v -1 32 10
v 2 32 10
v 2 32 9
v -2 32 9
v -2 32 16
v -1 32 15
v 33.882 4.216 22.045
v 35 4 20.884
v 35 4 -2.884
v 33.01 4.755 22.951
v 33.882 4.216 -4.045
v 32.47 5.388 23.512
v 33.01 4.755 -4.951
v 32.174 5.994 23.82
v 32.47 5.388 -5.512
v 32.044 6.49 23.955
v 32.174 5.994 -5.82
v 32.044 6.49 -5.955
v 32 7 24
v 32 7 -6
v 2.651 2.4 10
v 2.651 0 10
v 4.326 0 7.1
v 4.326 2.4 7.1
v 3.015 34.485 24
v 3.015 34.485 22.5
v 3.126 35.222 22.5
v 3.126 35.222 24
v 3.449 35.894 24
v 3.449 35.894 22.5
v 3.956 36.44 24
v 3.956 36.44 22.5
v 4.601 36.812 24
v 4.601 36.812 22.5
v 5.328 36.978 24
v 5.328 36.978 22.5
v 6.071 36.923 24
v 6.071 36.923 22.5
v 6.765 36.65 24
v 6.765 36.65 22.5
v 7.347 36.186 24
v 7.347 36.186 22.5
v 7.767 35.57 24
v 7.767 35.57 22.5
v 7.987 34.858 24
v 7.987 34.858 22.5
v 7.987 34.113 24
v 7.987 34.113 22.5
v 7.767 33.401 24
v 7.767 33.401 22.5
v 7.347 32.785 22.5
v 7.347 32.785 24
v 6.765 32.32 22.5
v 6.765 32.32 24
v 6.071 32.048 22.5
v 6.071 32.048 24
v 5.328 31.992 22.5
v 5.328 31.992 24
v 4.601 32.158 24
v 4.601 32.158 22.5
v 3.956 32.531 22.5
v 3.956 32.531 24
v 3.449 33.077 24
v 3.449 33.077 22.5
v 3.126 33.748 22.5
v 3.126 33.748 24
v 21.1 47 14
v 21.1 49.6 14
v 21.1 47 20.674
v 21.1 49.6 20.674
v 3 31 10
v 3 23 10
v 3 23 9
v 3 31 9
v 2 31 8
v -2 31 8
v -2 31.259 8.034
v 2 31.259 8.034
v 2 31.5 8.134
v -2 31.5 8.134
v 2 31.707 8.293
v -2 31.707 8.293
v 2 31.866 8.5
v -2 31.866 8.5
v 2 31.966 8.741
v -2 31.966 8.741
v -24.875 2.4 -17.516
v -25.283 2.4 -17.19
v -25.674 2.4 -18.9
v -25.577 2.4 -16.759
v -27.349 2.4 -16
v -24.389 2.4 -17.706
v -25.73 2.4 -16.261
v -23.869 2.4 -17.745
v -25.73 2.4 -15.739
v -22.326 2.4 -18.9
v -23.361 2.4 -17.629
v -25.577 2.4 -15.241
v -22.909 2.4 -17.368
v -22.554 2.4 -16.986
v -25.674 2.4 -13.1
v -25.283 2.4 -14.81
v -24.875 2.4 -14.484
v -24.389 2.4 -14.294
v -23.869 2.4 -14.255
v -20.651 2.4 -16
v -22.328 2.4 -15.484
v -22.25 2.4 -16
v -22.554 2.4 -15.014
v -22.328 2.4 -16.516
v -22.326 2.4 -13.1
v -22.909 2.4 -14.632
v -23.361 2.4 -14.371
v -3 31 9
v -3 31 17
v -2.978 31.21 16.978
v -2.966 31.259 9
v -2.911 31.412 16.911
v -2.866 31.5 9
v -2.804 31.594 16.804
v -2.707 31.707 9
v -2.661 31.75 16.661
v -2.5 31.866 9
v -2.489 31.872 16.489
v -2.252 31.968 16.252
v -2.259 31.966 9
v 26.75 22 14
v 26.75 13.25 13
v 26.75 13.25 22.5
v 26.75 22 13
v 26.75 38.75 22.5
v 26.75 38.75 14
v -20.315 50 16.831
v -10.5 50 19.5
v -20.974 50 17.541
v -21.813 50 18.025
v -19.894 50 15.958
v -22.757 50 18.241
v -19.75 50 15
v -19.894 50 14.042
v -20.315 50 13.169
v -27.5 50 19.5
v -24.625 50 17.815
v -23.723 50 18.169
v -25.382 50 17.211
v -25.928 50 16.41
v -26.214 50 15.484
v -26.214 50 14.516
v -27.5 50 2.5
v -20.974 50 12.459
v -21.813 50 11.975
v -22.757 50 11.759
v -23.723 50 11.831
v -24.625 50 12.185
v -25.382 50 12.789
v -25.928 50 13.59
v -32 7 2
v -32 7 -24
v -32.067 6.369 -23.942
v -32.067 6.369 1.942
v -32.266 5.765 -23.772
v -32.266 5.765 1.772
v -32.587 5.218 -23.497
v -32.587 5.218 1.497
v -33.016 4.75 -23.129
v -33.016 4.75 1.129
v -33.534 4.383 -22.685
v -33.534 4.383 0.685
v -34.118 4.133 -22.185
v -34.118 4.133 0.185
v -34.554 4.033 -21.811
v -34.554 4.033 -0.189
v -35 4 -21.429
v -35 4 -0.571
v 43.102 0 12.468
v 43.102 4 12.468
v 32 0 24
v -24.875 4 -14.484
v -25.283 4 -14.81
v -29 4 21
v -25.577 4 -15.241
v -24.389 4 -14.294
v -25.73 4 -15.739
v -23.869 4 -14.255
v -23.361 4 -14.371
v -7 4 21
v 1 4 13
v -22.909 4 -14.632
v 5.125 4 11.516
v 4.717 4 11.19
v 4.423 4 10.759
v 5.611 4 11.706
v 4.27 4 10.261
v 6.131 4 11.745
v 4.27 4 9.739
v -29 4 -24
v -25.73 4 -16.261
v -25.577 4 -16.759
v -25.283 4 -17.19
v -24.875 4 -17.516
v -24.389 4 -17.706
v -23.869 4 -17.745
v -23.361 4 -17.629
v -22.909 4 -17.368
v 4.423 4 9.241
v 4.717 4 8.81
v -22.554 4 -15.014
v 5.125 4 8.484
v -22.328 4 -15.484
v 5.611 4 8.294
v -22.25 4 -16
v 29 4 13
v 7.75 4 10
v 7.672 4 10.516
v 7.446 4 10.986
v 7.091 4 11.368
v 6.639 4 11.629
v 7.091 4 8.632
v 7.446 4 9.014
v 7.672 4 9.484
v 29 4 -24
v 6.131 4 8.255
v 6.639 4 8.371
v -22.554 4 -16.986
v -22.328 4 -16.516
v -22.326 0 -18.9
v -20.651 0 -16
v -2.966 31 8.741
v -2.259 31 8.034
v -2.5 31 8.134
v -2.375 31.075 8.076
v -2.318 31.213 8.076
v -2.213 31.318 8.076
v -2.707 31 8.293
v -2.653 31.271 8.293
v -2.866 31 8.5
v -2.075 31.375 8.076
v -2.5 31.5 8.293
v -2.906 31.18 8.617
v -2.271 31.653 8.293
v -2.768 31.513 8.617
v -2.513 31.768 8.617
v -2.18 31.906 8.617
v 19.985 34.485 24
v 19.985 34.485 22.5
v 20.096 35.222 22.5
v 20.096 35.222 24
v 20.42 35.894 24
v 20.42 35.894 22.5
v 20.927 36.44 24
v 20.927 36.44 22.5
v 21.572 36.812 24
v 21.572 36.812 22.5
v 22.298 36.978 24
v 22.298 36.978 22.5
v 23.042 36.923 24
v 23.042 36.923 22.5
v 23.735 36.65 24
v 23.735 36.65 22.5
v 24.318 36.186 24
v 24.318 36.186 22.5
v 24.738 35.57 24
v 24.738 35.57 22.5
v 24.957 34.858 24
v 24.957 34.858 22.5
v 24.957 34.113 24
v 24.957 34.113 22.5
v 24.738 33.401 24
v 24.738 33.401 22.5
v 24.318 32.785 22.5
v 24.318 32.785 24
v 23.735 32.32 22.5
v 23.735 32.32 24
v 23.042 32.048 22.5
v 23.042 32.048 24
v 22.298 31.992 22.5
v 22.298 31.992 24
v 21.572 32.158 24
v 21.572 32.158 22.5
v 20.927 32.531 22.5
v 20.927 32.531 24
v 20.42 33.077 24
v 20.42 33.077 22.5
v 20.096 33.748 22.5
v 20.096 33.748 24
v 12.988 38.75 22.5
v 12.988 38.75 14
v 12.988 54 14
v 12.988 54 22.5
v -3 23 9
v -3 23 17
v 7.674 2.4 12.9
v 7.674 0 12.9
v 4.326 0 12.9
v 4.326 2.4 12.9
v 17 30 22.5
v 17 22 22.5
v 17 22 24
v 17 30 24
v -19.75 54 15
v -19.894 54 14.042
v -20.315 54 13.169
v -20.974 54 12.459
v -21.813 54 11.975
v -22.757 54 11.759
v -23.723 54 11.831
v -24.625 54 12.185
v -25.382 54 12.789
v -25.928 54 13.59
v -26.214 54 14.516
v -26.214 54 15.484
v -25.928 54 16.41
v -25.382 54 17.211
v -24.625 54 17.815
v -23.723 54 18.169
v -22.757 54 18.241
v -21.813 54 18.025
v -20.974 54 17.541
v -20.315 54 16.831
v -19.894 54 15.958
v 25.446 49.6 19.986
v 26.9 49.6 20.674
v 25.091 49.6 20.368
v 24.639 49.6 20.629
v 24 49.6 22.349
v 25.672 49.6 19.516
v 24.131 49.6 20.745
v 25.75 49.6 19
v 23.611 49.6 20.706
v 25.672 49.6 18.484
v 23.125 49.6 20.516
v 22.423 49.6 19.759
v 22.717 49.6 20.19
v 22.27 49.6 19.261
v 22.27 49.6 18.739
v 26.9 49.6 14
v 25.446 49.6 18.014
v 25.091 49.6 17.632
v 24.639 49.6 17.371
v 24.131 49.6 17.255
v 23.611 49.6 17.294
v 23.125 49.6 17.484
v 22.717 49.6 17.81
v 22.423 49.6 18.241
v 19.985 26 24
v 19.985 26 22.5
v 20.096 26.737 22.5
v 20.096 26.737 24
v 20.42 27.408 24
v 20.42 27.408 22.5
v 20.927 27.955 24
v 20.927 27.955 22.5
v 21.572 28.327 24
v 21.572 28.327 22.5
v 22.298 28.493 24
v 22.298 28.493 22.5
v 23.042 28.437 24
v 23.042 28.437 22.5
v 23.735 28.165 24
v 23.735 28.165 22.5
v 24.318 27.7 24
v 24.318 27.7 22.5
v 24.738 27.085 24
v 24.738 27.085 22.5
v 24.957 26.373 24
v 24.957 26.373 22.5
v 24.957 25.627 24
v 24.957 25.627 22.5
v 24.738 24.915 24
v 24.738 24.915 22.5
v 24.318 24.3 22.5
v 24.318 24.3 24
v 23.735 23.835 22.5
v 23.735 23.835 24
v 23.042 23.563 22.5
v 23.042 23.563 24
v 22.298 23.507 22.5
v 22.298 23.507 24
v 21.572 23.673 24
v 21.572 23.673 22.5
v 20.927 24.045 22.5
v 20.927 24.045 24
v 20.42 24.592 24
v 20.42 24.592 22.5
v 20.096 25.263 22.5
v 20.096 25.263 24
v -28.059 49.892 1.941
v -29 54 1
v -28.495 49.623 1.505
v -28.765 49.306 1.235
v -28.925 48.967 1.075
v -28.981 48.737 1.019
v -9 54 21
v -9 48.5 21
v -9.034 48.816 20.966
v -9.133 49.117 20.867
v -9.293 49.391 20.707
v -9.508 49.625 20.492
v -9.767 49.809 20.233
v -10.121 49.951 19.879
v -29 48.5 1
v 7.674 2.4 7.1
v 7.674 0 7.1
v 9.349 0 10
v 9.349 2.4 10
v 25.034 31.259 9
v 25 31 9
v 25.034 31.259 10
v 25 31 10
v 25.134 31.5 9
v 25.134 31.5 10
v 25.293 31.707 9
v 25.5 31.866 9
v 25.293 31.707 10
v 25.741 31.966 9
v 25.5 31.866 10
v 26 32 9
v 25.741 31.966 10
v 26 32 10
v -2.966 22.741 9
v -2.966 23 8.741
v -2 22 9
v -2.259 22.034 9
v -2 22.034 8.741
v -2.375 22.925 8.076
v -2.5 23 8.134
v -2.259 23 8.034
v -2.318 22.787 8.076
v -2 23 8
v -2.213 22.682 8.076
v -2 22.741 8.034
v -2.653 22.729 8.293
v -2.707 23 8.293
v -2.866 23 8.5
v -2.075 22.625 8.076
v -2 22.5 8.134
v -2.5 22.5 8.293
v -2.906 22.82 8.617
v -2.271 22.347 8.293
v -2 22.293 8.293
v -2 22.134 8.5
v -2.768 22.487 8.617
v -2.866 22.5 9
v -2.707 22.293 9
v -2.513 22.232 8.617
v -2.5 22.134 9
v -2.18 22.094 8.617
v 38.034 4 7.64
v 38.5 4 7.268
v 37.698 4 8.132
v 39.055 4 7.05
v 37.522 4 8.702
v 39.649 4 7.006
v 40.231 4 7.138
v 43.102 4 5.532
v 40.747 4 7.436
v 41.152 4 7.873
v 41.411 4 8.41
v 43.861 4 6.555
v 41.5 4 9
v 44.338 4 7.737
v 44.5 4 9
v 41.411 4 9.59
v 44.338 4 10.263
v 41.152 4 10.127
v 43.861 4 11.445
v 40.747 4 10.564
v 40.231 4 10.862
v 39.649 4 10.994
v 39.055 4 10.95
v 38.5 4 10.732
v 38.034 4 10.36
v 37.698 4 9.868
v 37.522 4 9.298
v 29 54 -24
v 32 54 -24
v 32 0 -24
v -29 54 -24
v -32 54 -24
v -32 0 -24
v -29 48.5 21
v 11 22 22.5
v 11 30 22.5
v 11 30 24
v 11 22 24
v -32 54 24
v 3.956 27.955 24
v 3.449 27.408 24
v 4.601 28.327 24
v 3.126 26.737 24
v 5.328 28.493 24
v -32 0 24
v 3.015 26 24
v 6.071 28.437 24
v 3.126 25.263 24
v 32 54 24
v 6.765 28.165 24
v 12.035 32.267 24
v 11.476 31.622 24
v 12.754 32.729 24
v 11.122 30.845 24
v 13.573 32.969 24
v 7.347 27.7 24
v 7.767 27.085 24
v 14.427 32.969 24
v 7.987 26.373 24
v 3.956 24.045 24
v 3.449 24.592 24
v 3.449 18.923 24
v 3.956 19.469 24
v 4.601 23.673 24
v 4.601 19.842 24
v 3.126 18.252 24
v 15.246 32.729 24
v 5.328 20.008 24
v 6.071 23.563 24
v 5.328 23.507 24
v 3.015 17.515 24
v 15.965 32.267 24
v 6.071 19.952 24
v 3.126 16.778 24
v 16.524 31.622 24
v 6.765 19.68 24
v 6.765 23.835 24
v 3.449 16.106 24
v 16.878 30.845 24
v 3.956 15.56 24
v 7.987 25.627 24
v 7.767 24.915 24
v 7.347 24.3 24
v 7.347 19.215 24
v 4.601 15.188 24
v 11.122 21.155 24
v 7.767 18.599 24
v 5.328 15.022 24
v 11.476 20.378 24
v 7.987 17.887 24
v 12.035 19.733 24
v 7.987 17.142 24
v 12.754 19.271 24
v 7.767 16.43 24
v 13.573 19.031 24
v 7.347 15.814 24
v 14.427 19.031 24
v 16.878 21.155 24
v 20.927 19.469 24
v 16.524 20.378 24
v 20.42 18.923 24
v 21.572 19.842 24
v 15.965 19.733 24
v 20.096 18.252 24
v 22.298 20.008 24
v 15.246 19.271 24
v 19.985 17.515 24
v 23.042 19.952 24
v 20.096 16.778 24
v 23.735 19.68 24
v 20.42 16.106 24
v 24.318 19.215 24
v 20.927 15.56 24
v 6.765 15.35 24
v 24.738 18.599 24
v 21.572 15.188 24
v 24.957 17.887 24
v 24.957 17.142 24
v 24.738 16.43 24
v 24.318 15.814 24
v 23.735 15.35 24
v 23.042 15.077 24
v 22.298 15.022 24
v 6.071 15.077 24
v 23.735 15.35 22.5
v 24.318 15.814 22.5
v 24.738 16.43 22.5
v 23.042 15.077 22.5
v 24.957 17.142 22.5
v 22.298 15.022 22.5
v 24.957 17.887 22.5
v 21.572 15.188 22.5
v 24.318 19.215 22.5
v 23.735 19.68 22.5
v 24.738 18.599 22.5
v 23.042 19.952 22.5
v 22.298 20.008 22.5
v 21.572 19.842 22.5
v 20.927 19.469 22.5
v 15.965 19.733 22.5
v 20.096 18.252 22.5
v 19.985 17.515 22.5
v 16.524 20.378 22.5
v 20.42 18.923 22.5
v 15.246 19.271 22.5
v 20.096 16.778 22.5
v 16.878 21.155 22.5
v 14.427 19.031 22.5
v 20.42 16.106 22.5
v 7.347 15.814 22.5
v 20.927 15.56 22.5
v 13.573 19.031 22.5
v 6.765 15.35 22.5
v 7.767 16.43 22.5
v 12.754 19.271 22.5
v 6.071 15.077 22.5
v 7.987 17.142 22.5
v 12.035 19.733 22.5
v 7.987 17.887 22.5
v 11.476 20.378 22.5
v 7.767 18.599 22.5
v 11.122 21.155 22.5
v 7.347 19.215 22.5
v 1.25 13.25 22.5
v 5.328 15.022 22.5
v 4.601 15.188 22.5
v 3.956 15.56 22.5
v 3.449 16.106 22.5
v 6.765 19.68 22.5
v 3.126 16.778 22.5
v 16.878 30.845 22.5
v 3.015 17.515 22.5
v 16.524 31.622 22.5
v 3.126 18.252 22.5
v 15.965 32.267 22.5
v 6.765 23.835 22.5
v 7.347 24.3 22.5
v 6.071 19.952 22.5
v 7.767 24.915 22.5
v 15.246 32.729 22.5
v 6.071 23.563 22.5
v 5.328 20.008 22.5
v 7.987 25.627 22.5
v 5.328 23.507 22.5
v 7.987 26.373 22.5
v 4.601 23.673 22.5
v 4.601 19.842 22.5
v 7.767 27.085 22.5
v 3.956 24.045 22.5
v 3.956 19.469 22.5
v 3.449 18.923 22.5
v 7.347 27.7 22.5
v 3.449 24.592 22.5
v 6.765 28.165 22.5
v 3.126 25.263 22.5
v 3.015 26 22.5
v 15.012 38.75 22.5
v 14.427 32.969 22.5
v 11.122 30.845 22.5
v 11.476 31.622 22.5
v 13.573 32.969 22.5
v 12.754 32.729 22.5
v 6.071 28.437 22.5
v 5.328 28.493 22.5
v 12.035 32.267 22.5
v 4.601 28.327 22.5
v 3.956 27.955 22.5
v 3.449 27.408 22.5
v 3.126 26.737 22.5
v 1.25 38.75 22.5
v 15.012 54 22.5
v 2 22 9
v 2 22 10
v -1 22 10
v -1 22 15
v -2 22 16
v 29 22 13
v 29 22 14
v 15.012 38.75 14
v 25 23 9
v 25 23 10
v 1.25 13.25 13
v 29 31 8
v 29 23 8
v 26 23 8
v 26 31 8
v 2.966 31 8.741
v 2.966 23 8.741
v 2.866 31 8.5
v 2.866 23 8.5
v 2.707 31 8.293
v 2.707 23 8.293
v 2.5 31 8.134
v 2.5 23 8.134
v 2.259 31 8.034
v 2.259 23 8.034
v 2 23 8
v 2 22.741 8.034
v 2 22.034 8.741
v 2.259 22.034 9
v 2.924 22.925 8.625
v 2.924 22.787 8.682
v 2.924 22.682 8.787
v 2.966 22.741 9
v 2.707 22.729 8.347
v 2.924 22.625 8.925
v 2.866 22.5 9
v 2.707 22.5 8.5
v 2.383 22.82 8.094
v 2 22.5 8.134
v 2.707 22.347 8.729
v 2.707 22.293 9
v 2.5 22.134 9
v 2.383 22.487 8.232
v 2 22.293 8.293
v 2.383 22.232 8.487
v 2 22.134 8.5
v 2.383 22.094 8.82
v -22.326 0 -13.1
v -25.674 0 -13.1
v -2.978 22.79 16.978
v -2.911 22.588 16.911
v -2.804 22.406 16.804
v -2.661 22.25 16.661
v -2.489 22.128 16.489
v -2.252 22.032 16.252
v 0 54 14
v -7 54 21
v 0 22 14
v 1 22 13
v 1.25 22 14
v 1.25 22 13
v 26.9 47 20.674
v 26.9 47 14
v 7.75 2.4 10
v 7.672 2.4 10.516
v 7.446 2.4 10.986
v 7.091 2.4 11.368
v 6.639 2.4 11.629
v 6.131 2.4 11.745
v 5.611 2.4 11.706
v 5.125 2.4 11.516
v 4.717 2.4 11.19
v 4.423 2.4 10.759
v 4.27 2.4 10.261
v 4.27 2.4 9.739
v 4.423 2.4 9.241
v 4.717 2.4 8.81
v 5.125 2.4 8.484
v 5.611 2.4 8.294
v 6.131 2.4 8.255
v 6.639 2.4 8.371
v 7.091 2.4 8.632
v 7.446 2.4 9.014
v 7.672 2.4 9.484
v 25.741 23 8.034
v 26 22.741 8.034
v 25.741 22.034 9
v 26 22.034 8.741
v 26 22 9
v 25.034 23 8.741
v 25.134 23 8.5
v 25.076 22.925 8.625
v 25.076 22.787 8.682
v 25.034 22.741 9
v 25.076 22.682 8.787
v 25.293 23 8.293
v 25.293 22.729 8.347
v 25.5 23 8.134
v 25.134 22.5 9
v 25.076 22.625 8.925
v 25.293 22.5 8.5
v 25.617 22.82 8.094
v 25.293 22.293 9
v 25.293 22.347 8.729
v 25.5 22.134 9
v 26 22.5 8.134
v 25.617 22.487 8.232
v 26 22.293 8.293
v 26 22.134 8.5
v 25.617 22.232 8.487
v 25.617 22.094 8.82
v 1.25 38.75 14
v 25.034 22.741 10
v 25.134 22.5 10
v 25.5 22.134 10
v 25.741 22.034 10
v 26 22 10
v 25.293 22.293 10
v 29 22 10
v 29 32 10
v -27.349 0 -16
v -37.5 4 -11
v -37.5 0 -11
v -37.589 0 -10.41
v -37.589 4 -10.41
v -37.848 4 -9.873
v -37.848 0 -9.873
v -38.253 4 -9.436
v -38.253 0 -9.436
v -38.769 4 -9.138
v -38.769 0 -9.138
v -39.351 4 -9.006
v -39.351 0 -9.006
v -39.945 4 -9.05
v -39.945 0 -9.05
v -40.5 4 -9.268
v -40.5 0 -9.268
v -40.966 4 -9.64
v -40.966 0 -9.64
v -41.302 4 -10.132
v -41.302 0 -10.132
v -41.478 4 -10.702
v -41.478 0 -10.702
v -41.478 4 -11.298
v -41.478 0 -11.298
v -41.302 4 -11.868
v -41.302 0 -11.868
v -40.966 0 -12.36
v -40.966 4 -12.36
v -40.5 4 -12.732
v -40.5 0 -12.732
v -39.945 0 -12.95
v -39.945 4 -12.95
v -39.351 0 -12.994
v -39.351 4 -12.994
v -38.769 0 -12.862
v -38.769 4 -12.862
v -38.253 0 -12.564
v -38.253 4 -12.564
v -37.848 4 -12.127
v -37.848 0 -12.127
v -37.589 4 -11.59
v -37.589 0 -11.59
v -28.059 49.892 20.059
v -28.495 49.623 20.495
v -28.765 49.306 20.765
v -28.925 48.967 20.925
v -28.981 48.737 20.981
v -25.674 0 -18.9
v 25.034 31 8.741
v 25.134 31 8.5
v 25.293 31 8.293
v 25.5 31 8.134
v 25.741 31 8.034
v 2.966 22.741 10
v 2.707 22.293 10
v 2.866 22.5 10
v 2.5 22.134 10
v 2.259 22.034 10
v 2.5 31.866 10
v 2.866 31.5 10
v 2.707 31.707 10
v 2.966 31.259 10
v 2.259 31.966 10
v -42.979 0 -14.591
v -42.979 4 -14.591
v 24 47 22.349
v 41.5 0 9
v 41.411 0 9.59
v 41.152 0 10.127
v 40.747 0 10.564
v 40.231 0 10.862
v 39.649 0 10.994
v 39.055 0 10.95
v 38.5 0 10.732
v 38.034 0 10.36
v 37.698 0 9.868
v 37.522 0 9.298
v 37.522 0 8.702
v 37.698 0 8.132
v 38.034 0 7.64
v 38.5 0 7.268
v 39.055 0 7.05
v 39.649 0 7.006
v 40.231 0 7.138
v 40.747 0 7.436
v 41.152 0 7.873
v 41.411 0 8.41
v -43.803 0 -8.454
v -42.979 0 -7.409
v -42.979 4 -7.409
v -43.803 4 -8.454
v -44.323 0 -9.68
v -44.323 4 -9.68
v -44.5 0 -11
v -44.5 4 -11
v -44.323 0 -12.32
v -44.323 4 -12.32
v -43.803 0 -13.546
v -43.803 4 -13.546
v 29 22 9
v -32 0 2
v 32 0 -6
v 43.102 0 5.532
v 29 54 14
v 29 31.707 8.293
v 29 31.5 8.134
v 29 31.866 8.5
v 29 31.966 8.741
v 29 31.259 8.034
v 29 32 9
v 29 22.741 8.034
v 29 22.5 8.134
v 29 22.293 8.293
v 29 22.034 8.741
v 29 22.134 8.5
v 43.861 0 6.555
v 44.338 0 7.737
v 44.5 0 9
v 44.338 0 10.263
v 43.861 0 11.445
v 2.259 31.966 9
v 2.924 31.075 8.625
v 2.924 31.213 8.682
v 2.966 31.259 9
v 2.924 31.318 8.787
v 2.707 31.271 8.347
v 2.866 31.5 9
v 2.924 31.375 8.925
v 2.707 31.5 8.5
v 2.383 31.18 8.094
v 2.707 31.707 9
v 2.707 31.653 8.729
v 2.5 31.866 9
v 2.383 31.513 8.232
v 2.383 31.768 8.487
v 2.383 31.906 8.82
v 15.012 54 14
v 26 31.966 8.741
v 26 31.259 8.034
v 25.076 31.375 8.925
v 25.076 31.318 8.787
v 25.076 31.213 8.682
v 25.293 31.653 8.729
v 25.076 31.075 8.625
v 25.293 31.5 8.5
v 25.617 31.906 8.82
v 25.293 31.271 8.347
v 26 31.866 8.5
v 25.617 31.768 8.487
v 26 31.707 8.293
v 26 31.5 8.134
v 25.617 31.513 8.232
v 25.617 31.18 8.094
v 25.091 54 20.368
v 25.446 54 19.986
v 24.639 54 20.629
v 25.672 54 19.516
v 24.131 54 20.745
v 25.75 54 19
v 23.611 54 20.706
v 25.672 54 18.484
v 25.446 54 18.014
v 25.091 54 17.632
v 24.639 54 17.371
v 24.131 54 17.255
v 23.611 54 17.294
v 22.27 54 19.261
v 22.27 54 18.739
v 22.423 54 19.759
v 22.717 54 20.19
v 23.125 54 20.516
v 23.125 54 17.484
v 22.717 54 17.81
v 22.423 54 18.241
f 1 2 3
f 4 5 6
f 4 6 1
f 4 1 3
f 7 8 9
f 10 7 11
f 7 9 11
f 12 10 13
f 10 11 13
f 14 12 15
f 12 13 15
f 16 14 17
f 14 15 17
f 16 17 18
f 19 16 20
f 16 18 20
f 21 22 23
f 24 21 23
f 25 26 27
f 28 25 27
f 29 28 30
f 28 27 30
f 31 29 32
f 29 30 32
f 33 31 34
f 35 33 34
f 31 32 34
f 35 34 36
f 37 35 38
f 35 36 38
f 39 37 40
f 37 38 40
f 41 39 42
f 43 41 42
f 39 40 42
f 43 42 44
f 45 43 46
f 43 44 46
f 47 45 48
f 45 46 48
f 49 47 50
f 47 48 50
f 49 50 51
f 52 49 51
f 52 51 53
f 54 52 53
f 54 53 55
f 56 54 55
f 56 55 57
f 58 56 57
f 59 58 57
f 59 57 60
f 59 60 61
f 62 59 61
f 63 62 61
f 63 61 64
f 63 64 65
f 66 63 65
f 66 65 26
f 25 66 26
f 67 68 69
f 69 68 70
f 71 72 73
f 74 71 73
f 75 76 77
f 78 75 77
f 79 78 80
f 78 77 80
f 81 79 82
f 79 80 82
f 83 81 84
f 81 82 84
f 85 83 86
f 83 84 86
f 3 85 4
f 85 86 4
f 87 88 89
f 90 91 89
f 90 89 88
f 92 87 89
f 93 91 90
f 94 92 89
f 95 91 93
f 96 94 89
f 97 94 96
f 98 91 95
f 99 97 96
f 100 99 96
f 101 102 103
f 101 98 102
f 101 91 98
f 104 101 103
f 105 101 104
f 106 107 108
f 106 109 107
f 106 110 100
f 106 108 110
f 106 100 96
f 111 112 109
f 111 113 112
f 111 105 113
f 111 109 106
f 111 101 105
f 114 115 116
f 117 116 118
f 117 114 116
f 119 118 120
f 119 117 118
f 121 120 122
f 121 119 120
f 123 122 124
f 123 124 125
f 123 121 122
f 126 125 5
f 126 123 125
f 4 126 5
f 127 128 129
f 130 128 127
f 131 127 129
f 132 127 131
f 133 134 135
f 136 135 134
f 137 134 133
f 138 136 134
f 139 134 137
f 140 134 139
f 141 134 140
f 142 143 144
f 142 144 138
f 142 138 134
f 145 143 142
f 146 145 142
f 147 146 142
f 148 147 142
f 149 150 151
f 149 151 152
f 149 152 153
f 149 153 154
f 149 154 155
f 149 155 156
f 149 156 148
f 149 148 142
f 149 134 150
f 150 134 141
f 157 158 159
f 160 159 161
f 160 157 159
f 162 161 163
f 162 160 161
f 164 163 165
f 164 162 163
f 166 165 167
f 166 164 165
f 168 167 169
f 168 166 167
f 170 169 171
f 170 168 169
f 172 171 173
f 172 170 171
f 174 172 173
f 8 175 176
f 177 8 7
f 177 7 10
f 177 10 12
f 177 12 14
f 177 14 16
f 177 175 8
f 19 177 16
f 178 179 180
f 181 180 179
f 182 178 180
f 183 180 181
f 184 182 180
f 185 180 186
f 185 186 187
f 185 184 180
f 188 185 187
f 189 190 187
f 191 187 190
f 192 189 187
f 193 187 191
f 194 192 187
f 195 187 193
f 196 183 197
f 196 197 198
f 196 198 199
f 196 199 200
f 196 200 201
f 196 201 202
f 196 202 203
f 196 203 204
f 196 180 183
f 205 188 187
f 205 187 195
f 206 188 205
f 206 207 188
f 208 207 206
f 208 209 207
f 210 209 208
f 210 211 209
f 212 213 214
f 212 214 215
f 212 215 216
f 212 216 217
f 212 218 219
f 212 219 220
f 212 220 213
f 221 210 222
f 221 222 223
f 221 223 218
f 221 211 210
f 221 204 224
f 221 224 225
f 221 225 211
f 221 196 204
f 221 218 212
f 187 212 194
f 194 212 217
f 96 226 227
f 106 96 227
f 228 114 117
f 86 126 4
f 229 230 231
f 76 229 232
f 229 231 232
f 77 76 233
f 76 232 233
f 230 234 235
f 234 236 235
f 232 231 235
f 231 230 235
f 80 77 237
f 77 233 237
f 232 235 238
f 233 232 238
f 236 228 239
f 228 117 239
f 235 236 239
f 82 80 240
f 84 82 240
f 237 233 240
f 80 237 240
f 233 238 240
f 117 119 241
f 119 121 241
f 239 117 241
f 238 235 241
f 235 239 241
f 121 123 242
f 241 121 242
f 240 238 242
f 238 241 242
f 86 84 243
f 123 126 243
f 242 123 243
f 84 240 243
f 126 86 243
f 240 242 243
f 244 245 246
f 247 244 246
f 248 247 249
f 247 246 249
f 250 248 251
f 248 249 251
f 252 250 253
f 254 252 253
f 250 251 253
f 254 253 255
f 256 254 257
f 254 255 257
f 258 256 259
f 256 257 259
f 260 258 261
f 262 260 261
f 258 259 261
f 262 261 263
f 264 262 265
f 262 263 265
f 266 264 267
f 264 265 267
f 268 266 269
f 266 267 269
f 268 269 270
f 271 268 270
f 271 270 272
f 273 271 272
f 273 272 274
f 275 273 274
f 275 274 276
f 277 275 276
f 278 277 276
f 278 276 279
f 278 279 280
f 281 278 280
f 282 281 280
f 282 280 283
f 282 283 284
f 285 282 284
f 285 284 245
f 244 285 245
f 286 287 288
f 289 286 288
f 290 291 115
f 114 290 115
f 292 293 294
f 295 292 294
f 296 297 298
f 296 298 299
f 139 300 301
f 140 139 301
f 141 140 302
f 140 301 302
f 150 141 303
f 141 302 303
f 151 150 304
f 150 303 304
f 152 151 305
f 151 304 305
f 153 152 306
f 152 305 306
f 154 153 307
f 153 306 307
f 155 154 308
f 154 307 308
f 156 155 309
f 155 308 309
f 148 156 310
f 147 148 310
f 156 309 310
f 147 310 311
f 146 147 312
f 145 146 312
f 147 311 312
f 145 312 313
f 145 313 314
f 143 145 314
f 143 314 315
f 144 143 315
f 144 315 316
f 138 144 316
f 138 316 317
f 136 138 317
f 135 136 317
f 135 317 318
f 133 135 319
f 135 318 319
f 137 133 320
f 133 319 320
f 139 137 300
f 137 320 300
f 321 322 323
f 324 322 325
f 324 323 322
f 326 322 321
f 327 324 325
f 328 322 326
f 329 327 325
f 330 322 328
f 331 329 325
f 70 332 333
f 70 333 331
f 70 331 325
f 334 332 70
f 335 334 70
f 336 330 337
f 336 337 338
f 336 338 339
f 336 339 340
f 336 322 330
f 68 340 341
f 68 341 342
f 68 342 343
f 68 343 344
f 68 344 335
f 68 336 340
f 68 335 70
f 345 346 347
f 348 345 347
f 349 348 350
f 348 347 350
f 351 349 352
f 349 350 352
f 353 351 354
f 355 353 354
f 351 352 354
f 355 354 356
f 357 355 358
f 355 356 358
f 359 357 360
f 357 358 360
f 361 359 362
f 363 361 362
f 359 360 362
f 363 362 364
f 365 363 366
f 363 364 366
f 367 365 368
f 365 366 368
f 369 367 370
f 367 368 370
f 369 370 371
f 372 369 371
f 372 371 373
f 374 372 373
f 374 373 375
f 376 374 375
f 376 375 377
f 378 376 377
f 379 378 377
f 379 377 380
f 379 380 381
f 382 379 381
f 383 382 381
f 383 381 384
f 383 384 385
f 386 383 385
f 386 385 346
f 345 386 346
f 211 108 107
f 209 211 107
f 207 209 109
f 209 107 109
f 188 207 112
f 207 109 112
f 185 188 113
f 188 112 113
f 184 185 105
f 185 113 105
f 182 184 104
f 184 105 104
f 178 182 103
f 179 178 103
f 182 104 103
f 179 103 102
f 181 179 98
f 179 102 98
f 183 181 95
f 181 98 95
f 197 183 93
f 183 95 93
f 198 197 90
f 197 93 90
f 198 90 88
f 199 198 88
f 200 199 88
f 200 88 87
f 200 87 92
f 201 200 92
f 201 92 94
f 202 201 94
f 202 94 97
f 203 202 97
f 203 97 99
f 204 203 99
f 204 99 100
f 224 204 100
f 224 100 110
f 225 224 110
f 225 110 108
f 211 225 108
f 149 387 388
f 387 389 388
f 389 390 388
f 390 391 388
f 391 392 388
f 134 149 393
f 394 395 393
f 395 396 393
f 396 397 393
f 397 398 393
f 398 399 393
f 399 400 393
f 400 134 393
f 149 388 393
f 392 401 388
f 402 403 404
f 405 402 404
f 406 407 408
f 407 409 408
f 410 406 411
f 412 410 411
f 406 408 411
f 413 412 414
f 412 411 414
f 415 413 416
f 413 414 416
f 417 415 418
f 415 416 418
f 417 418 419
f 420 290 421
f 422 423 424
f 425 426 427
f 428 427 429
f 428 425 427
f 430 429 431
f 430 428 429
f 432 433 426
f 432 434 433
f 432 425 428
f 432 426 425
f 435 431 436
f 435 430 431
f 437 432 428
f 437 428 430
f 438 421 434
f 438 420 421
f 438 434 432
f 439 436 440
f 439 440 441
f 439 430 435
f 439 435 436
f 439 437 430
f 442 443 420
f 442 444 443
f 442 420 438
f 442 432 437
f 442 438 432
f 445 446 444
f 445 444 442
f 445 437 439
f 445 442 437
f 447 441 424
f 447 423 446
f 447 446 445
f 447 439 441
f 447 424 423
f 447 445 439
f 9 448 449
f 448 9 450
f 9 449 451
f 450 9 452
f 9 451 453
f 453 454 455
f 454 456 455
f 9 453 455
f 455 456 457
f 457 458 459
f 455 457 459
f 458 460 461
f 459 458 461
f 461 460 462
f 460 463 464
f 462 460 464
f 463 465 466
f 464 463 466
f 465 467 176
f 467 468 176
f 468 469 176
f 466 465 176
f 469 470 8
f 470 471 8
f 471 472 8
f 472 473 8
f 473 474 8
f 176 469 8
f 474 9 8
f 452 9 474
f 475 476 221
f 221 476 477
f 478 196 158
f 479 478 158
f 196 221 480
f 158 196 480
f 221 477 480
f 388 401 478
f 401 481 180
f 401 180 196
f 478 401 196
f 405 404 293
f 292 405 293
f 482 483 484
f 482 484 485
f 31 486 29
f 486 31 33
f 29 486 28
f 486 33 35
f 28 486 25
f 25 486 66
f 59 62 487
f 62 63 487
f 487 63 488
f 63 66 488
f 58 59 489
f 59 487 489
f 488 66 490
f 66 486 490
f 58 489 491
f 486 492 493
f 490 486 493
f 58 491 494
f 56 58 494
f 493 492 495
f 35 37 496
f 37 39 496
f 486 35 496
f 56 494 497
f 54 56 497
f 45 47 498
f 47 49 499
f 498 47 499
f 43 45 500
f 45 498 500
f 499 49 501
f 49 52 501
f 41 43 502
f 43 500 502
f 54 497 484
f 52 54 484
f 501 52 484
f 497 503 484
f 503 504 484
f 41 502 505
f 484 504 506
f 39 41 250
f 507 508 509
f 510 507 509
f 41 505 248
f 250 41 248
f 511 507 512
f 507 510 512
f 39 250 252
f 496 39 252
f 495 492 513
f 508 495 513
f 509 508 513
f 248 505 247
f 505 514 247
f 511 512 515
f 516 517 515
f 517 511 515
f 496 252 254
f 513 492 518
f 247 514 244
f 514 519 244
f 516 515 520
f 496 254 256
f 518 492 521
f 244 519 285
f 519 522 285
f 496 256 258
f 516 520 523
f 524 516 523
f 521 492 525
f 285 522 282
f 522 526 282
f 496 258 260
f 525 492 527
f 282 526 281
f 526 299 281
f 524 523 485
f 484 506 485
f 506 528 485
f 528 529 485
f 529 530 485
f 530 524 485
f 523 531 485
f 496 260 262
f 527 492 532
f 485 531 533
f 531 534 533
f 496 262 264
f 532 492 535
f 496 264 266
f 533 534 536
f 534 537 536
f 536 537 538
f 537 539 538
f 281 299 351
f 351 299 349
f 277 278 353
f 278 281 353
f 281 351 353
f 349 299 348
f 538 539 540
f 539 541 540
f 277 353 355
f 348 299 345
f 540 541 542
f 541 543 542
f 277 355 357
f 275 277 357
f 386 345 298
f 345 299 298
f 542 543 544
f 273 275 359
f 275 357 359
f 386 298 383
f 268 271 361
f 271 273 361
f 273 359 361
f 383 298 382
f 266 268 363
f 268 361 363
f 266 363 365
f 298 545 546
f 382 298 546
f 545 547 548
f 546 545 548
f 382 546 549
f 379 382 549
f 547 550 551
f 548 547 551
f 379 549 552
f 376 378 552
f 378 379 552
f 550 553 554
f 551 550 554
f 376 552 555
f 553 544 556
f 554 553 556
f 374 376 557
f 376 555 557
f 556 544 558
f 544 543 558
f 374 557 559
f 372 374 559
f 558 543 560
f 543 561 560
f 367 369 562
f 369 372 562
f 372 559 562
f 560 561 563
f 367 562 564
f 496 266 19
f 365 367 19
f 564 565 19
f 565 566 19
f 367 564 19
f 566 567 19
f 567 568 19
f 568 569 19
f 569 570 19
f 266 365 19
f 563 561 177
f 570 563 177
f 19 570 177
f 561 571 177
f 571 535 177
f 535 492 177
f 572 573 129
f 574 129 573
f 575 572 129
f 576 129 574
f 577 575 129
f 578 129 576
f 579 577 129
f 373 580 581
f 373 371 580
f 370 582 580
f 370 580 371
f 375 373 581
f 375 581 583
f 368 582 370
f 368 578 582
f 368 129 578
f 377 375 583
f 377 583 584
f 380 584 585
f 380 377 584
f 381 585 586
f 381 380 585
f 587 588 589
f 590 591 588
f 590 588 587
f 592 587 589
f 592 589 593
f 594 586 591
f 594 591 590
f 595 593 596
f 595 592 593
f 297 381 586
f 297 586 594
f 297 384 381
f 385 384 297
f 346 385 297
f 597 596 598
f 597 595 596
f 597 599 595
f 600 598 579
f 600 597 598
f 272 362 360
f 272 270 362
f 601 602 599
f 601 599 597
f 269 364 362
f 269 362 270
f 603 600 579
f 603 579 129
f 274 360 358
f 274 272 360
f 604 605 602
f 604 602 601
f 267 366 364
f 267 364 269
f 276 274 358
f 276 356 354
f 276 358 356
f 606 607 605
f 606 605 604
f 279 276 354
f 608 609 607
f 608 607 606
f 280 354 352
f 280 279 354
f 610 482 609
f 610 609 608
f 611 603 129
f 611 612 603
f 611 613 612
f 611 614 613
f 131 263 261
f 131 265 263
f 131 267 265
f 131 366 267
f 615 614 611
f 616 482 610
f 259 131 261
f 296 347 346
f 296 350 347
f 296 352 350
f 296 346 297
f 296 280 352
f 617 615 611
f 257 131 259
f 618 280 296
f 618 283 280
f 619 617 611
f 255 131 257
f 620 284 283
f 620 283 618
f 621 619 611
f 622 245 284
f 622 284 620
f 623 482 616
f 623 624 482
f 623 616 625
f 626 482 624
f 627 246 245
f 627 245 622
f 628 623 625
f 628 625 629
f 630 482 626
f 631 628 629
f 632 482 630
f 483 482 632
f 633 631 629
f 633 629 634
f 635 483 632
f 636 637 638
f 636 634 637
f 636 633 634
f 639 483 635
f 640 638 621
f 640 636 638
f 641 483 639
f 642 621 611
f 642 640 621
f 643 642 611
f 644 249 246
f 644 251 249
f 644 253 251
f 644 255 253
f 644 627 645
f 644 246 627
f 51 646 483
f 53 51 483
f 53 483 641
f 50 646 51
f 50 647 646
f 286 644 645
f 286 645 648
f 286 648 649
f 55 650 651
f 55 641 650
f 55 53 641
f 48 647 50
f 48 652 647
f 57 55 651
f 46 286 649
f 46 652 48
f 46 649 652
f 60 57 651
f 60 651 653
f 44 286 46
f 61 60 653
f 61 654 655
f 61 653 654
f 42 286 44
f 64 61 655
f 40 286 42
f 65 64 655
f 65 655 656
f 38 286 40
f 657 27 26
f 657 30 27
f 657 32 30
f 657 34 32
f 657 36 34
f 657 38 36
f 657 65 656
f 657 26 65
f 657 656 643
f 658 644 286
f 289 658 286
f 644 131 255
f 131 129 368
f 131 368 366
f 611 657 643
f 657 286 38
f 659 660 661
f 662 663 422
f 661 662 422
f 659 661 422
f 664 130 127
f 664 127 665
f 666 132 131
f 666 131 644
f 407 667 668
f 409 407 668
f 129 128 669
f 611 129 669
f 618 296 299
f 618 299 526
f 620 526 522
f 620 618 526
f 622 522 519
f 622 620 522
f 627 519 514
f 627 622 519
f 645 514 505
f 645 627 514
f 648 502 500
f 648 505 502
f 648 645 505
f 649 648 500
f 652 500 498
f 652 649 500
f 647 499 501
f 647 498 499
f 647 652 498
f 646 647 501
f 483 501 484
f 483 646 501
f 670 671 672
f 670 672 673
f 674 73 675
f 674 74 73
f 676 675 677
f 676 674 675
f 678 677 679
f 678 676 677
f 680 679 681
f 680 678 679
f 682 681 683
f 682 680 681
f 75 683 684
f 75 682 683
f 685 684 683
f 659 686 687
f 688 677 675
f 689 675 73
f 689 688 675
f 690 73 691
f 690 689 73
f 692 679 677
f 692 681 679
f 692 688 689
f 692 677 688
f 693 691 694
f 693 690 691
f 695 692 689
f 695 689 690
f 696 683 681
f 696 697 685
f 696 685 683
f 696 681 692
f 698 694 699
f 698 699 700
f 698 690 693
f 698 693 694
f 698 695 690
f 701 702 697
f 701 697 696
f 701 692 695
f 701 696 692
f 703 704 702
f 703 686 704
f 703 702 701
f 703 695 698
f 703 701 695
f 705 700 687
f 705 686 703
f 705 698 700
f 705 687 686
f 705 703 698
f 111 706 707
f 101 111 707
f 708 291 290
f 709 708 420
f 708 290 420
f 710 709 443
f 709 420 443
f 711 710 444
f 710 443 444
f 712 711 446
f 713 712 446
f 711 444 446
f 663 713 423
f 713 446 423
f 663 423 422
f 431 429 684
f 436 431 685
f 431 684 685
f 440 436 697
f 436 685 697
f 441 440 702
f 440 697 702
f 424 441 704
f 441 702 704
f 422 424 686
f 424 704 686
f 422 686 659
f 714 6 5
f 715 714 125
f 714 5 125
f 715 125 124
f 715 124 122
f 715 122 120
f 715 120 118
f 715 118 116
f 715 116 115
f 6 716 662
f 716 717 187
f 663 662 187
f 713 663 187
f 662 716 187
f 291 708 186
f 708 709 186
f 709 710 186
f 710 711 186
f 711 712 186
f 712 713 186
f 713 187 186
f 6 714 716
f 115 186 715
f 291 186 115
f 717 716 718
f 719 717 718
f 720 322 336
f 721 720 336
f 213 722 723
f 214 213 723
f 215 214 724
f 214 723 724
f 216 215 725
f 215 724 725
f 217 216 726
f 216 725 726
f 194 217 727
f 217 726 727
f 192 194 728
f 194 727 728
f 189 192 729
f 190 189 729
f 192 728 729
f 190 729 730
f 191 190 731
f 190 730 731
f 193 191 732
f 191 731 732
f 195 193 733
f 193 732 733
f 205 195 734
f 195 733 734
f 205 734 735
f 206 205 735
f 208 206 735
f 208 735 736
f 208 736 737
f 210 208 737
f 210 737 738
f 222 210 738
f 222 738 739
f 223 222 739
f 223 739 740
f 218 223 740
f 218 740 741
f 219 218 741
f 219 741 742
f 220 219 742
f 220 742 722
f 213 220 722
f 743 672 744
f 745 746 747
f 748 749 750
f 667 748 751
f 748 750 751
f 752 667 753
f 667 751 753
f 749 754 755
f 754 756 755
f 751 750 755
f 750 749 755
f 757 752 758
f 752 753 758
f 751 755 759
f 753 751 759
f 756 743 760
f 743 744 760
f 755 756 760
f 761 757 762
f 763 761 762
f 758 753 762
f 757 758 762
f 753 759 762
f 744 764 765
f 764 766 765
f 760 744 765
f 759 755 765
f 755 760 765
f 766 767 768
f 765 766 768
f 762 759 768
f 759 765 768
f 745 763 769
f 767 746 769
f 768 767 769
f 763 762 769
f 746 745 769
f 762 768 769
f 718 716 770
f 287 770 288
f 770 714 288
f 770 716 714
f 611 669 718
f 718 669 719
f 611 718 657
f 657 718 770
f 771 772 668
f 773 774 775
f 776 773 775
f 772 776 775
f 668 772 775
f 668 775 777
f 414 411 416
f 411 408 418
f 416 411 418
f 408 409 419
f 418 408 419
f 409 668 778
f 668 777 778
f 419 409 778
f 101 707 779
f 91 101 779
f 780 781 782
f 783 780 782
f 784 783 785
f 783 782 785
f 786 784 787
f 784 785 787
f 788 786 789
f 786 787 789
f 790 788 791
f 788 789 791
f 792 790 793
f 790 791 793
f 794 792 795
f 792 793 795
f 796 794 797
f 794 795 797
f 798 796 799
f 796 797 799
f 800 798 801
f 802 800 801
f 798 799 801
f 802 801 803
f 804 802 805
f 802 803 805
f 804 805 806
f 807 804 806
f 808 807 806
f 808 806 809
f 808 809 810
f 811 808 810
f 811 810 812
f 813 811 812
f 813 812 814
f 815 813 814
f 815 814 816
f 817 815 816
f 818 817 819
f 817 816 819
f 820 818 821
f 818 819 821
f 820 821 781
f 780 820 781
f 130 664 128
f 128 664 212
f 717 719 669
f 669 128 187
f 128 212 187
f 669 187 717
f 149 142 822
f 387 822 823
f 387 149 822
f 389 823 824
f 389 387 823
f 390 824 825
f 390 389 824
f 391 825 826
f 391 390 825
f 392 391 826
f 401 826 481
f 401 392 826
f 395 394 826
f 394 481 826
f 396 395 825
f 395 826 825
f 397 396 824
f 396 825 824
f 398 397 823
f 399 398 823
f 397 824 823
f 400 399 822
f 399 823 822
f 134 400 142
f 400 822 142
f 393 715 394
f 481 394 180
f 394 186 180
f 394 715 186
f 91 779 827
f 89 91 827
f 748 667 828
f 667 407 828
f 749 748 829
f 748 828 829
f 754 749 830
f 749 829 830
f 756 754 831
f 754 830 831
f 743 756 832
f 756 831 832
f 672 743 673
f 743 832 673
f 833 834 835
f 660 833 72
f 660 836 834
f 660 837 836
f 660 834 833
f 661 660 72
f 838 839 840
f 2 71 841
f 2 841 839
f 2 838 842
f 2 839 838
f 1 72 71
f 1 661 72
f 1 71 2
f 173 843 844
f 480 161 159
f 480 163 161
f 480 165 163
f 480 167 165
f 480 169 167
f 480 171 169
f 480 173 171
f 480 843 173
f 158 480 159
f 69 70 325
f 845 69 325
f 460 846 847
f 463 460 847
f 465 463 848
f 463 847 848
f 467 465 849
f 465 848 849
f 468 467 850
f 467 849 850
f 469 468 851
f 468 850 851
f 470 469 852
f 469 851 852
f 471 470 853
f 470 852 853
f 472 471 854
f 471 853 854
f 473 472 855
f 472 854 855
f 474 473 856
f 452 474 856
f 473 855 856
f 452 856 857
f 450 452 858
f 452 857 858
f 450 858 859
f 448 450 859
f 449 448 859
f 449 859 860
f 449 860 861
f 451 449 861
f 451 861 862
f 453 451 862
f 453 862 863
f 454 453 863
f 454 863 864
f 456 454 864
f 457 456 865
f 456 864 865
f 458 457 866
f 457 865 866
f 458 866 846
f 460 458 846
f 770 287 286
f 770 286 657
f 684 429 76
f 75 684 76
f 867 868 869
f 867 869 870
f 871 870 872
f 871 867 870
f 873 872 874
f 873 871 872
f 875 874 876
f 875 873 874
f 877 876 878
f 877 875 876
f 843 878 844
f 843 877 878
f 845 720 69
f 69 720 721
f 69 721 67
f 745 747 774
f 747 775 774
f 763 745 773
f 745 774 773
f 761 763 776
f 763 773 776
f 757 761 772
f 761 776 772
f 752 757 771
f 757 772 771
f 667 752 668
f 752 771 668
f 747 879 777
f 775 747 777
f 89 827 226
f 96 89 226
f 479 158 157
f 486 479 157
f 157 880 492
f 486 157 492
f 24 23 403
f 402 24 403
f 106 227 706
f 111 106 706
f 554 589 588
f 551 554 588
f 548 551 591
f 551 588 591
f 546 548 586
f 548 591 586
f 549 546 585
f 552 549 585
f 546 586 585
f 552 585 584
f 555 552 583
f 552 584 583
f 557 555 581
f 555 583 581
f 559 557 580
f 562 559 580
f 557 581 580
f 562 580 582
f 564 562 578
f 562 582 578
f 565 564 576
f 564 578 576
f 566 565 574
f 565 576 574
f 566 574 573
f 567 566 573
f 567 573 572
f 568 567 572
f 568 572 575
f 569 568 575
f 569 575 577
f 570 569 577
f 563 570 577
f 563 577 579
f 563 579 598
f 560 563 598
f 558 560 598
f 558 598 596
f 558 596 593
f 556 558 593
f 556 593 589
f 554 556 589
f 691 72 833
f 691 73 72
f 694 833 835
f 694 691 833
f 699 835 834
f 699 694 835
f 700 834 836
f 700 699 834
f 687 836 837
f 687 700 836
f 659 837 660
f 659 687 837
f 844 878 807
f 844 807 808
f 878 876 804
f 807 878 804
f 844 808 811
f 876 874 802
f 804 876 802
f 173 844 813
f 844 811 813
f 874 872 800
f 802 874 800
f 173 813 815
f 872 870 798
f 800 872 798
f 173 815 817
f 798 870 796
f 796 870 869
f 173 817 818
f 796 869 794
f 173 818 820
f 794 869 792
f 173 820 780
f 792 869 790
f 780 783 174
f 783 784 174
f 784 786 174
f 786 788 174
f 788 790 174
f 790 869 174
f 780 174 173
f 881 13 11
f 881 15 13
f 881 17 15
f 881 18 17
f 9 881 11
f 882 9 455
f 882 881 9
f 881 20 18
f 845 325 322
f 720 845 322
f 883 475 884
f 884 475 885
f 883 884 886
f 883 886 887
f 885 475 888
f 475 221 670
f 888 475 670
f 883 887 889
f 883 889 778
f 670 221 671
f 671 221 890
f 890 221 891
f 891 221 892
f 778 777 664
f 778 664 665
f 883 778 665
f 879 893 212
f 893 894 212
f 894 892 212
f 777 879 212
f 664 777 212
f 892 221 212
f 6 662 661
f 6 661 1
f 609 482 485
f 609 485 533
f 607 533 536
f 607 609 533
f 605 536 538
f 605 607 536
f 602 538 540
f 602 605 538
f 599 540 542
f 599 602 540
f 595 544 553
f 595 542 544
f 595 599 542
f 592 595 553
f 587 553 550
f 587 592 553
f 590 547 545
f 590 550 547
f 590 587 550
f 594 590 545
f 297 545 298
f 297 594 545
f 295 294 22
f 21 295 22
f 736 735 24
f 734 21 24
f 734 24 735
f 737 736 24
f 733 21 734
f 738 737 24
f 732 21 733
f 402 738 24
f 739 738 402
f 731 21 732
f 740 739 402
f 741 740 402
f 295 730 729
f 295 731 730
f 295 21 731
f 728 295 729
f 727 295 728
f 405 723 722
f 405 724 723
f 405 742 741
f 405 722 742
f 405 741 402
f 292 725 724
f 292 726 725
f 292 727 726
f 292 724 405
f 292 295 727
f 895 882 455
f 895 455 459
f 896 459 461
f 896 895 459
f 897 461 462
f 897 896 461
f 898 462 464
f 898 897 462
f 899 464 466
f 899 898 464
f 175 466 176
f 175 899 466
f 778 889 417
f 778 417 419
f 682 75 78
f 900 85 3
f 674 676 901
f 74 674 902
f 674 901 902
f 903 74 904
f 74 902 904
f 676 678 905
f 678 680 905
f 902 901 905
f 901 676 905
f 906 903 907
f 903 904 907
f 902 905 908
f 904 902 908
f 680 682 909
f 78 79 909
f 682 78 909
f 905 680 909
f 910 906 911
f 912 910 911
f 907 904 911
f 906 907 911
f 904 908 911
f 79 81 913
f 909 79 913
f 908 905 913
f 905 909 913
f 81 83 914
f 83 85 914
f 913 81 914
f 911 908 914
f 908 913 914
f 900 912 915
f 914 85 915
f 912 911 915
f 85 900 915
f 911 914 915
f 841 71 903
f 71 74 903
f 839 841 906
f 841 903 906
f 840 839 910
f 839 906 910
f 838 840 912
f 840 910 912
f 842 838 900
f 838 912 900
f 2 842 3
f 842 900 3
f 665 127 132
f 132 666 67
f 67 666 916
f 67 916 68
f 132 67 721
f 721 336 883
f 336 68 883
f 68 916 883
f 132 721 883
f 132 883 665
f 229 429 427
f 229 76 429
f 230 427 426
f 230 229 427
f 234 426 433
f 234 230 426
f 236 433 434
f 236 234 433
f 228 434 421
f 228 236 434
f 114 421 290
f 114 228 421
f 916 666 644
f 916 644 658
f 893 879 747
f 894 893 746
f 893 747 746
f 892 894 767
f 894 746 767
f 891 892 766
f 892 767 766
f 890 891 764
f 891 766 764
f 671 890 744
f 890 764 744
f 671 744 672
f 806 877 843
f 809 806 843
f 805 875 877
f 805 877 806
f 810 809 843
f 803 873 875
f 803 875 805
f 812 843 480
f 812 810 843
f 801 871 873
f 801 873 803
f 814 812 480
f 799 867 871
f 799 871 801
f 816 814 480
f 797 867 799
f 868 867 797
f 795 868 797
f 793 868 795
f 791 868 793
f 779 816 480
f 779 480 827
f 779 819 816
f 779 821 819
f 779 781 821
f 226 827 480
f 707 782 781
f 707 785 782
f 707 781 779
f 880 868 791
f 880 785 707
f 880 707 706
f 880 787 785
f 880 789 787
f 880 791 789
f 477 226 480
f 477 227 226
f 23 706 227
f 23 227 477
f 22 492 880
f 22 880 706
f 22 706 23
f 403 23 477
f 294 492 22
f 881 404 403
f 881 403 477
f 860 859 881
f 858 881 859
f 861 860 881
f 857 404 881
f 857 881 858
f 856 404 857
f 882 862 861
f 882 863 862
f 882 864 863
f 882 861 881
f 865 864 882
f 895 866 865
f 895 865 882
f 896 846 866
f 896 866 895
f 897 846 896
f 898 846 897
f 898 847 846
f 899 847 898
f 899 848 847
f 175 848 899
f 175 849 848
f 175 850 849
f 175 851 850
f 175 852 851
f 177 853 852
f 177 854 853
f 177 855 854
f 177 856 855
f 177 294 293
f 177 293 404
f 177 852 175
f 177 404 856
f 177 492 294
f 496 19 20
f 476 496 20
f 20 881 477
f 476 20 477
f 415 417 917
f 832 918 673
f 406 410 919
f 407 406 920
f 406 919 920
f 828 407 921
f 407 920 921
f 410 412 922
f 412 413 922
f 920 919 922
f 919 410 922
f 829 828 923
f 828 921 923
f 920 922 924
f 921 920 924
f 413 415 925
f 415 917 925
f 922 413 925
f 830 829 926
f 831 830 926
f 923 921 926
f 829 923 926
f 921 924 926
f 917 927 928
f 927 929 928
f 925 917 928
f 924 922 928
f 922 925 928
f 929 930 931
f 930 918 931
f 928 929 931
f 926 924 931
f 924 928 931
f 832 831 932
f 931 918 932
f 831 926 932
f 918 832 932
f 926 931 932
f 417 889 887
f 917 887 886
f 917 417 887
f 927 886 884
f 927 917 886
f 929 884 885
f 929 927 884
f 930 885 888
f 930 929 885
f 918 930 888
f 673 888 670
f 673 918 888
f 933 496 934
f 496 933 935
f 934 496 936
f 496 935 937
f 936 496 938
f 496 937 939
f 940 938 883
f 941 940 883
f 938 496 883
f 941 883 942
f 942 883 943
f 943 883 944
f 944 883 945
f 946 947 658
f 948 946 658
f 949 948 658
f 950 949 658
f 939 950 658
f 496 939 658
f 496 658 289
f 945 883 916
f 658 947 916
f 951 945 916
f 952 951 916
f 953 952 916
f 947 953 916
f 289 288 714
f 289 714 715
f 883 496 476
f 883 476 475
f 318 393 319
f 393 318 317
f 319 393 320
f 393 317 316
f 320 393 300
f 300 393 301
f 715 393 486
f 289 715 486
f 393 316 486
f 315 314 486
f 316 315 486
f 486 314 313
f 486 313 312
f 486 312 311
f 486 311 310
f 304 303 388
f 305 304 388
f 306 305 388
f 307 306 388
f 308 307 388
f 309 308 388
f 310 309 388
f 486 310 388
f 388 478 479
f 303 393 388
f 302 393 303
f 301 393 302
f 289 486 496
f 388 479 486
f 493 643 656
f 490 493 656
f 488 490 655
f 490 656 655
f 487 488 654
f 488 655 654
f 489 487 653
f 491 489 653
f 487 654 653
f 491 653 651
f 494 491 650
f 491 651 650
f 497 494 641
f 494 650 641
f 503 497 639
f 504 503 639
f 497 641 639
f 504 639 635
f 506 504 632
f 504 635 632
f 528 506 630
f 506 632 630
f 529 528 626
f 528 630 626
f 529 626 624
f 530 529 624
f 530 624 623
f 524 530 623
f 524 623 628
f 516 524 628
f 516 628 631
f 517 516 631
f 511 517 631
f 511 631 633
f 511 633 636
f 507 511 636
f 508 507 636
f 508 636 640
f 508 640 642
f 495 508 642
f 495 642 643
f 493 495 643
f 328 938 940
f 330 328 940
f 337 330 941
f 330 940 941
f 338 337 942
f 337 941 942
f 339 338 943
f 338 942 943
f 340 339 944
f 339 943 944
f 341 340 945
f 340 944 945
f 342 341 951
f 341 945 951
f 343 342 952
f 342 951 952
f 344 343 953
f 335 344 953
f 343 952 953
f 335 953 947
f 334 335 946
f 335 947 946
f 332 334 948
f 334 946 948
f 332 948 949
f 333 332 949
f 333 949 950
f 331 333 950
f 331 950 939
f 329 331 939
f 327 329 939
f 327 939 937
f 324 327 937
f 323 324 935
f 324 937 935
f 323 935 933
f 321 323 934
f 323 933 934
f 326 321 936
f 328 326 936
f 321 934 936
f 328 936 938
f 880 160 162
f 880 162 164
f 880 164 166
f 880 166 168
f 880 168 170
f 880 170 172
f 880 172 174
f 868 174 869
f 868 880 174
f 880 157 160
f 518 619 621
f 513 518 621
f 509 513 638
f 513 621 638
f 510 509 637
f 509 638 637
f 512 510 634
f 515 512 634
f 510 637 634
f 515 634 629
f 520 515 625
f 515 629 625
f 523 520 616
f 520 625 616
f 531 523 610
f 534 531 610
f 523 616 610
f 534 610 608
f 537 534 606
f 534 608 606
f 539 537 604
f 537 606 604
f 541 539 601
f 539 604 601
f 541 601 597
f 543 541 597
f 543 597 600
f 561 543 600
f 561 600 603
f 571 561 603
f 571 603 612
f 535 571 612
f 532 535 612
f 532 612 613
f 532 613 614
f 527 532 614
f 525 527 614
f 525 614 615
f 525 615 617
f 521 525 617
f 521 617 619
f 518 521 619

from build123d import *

# Parameters (mm, degrees)
SKETCH1_W            = 64
SKETCH1_H            = 48
BOSS_EXTRUDE1_DEPTH  = 4
CUT_EXTRUDE1_DEPTH   = 2.4
CUT_EXTRUDE2_DEPTH   = 2.4
BOSS_EXTRUDE3_DEPTH  = 50
BOSS_EXTRUDE4_DEPTH  = 50
SKETCH10_W           = 2.02372337
SKETCH10_H           = 15.25
SKETCH10_W_2         = 25.5
SKETCH10_H_2         = 25.5
CUT_EXTRUDE4_DEPTH   = 9.5
SKETCH13_W           = 36.946258726
SKETCH13_H           = 1
CUT_EXTRUDE6_DEPTH   = 32
SKETCH15_R           = 3.25
BOSS_EXTRUDE5_DEPTH  = 4
CUT_EXTRUDE7_DEPTH   = 7
SKETCH18_W           = 5.8
SKETCH18_H           = 2.6
CUT_EXTRUDE8_DEPTH   = 5
SKETCH19_R           = 1.75
BOSS_EXTRUDE8_DEPTH  = 4.4
FILLET1_R            = 1.5
SKETCH20_R           = 2
BOSS_EXTRUDE9_DEPTH  = 4
FILLET2_R            = 3
SKETCH22_R           = 1.75
CUT_EXTRUDE9_DEPTH   = 2
SKETCH23_R           = 2.5
CUT_EXTRUDE10_DEPTH  = 3
SKETCH24_W           = 2
SKETCH24_H           = 10
BOSS_EXTRUDE10_DEPTH = 4
SKETCH25_W           = 2
SKETCH25_H           = 10
BOSS_EXTRUDE11_DEPTH = 13
SKETCH26_W           = 2
SKETCH26_H           = 10
BOSS_EXTRUDE12_DEPTH = 4
FILLET4_R            = 1


with BuildPart() as part:
    # Sketch1 → Boss-Extrude1 (new body)
    with BuildSketch(Plane(origin=(0, 0, 0), x_dir=(1, 0, 0), z_dir=(0, 1, 0))):
        Rectangle(SKETCH1_W, SKETCH1_H)
    extrude(amount=BOSS_EXTRUDE1_DEPTH)

    # Sketch2 → Cut-Extrude1 (cut)
    with BuildSketch(Plane.XZ):
        Polygon((-20.651368439, -16), (-22.325684219, -13.1), (-25.674315781, -13.1), (-27.348631561, -16), (-25.674315781, -18.9), (-22.325684219, -18.9), align=None)
    extrude(amount=-CUT_EXTRUDE1_DEPTH, mode=Mode.SUBTRACT)

    # Sketch4 → Cut-Extrude2 (cut)
    with BuildSketch(Plane.XZ):
        Polygon((9.348631561, 10), (7.674315781, 12.9), (4.325684219, 12.9), (2.651368439, 10), (4.325684219, 7.1), (7.674315781, 7.1), align=None)
    extrude(amount=-CUT_EXTRUDE2_DEPTH, mode=Mode.SUBTRACT)

    # Sketch6 → Boss-Extrude3 (add)
    with BuildSketch(Plane(origin=(0, 4, 0), x_dir=(1, 0, 0), z_dir=(0, 1, 0))):
        Polygon((-29, -21), (-29, 21), (-29, 24), (-32, 24), (-32, -24), (32, -24), (32, 24), (29, 24), (29, 21), (29, -21), align=None)
    extrude(amount=BOSS_EXTRUDE3_DEPTH)

    # Sketch9 → Boss-Extrude4 (add)
    with BuildSketch(Plane(origin=(0, 4, 0), x_dir=(1, 0, 0), z_dir=(0, 1, 0))):
        Polygon((29, -13), (1, -13), (-7, -21), (29, -21), align=None)
    extrude(amount=BOSS_EXTRUDE4_DEPTH)

    # Sketch10 → Cut-Extrude4 (cut)
    with BuildSketch(Plane(origin=(0, 0, 13), x_dir=(-1, 0, 0), z_dir=(0, 0, -1))):
        with Locations((-14, 46.375)):
            Rectangle(SKETCH10_W, SKETCH10_H)
        with Locations((-14, 26)):
            Rectangle(SKETCH10_W_2, SKETCH10_H_2)
    extrude(amount=-CUT_EXTRUDE4_DEPTH, mode=Mode.SUBTRACT)

    # Sketch13 → Cut-Extrude6 (cut)
    with BuildSketch(Plane(origin=(0, 54, 0), x_dir=(1, 0, 0), z_dir=(0, 1, 0))):
        with Locations((10.526870637, -13.5)):
            Rectangle(SKETCH13_W, SKETCH13_H)
    extrude(amount=-CUT_EXTRUDE6_DEPTH, mode=Mode.SUBTRACT)

    # Sketch15 → Boss-Extrude5 (add)
    with BuildSketch(Plane(origin=(0, 54, 0), x_dir=(1, 0, 0), z_dir=(0, 1, 0))):
        Polygon((-29, -1), (-9, -21), (-29, -21), align=None)
        with Locations((-23, -15)):
            Circle(SKETCH15_R, mode=Mode.SUBTRACT)
    extrude(amount=-BOSS_EXTRUDE5_DEPTH)

    # Sketch17 → Cut-Extrude7 (cut)
    with BuildSketch(Plane(origin=(0, 54, 0), x_dir=(1, 0, 0), z_dir=(0, 1, 0))):
        Polygon((24, -15.651368439), (21.1, -17.325684219), (21.1, -20.674315781), (24, -22.348631561), (26.9, -20.674315781), (26.9, -17.325684219), align=None)
    extrude(amount=-CUT_EXTRUDE7_DEPTH, mode=Mode.SUBTRACT)

    # Sketch18 → Cut-Extrude8 (cut)
    with BuildSketch(Plane(origin=(0, 0, 14), x_dir=(-1, 0, 0), z_dir=(0, 0, -1))):
        with Locations((-24, 48.3)):
            Rectangle(SKETCH18_W, SKETCH18_H)
    extrude(amount=-CUT_EXTRUDE8_DEPTH, mode=Mode.SUBTRACT)

    # Sketch19 → Boss-Extrude8 (add)
    with BuildSketch(Plane(origin=(0, 54, 0), x_dir=(1, 0, 0), z_dir=(0, 1, 0))):
        Polygon((24, -15.651368439), (26.9, -17.325684219), (26.9, -20.674315781), (24, -22.348631561), (21.1, -20.674315781), (21.1, -17.325684219), align=None)
        with Locations((24, -19)):
            Circle(SKETCH19_R, mode=Mode.SUBTRACT)
    extrude(amount=-BOSS_EXTRUDE8_DEPTH)

    # Fillet1
    fillet1_edges = [part.edges().sort_by_distance(p)[0] for p in [
        (-29, 50, 11),
        (-19, 50, 21),
    ]]
    fillet(fillet1_edges, radius=FILLET1_R)

    # Sketch20 → Boss-Extrude9 (add)
    with BuildSketch(Plane.XZ):
        with BuildLine():
            Line((43.102082828, 12.467708073), (32.000000003, 23.999999995))
            Line((32.000000003, 23.999999995), (32, -6.000000006))
            Line((32, -6.000000006), (43.102082819, 5.532291906))
            ThreePointArc((43.102082819, 5.532291906), (44.500000003, 8.999999988), (43.102082828, 12.467708073))
        make_face()
        with Locations((39.500000002, 8.999999994)):
            Circle(SKETCH20_R, mode=Mode.SUBTRACT)
        with BuildLine():
            Line((-32, -24), (-32, 2.000000002))
            Line((-32, 2.000000002), (-42.978939192, -7.408763151))
            ThreePointArc((-42.978939192, -7.408763151), (-44.499999999, -10.999999999), (-42.978939192, -14.591236846))
            Line((-42.978939192, -14.591236846), (-32, -24))
        make_face()
        with Locations((-39.499999999, -10.999999999)):
            Circle(SKETCH20_R, mode=Mode.SUBTRACT)
    extrude(amount=-BOSS_EXTRUDE9_DEPTH)

    # Fillet2
    fillet2_edges = [part.edges().sort_by_distance(p)[0] for p in [
        (-32, 4, -10.999999999),
        (32.000000002, 4, 8.999999995),
    ]]
    fillet(fillet2_edges, radius=FILLET2_R)

    # Sketch22 → Cut-Extrude9 (cut)
    with BuildSketch(Plane.XZ.offset(-2.4)):
        with Locations((-24, -16)):
            Circle(SKETCH22_R)
        with Locations((6, 10)):
            Circle(SKETCH22_R)
    extrude(amount=-CUT_EXTRUDE9_DEPTH, mode=Mode.SUBTRACT)

    # Sketch23 → Cut-Extrude10 (cut)
    with BuildSketch(Plane(origin=(0, 0, 22.5), x_dir=(-1, 0, 0), z_dir=(0, 0, -1))):
        with Locations((-22.485281374, 34.485281374)):
            Circle(SKETCH23_R)
        with Locations((-5.514718626, 34.485281374)):
            Circle(SKETCH23_R)
        with Locations((-5.514718626, 17.514718626)):
            Circle(SKETCH23_R)
        with Locations((-22.485281374, 17.514718626)):
            Circle(SKETCH23_R)
        with Locations((-22.485281374, 26)):
            Circle(SKETCH23_R)
        with Locations((-5.514718626, 26)):
            Circle(SKETCH23_R)
        with BuildLine():
            Line((-11, 30), (-11, 22))
            ThreePointArc((-11, 22), (-14, 19), (-17, 22))
            Line((-17, 22), (-17, 30))
            ThreePointArc((-17, 30), (-14, 33), (-11, 30))
        make_face()
    extrude(amount=-CUT_EXTRUDE10_DEPTH, mode=Mode.SUBTRACT)

    # Sketch24 → Boss-Extrude10 (add)
    with BuildSketch(Plane.ZY.offset(-29)):
        with Locations((9, 27)):
            Rectangle(SKETCH24_W, SKETCH24_H)
    extrude(amount=BOSS_EXTRUDE10_DEPTH)

    # Sketch25 → Boss-Extrude11 (add)
    with BuildSketch(Plane(origin=(0, 0, 21), x_dir=(-1, 0, 0), z_dir=(0, 0, -1))):
        with Locations((2, 27)):
            Rectangle(SKETCH25_W, SKETCH25_H)
    extrude(amount=BOSS_EXTRUDE11_DEPTH)

    # Sketch26 → Boss-Extrude12 (add)
    with BuildSketch(Plane(origin=(-1, 0, 0), x_dir=(0, 0, -1), z_dir=(1, 0, 0))):
        with Locations((-9, 27)):
            Rectangle(SKETCH26_W, SKETCH26_H)
    extrude(amount=BOSS_EXTRUDE12_DEPTH)

    # Fillet4
    fillet4_edges = [part.edges().sort_by_distance(p)[0] for p in [
        (27, 32, 8),
        (27, 22, 8),
        (25, 32, 9),
        (25, 27, 8),
        (25, 22, 9),
        (-3, 22, 12.5),
        (-3, 32, 12.5),
        (-3, 27, 8),
        (0, 32, 8),
        (0, 22, 8),
        (3, 27, 8),
        (3, 32, 9),
        (3, 22, 9),
    ]]
    fillet(fillet4_edges, radius=FILLET4_R)


solid = part.part
